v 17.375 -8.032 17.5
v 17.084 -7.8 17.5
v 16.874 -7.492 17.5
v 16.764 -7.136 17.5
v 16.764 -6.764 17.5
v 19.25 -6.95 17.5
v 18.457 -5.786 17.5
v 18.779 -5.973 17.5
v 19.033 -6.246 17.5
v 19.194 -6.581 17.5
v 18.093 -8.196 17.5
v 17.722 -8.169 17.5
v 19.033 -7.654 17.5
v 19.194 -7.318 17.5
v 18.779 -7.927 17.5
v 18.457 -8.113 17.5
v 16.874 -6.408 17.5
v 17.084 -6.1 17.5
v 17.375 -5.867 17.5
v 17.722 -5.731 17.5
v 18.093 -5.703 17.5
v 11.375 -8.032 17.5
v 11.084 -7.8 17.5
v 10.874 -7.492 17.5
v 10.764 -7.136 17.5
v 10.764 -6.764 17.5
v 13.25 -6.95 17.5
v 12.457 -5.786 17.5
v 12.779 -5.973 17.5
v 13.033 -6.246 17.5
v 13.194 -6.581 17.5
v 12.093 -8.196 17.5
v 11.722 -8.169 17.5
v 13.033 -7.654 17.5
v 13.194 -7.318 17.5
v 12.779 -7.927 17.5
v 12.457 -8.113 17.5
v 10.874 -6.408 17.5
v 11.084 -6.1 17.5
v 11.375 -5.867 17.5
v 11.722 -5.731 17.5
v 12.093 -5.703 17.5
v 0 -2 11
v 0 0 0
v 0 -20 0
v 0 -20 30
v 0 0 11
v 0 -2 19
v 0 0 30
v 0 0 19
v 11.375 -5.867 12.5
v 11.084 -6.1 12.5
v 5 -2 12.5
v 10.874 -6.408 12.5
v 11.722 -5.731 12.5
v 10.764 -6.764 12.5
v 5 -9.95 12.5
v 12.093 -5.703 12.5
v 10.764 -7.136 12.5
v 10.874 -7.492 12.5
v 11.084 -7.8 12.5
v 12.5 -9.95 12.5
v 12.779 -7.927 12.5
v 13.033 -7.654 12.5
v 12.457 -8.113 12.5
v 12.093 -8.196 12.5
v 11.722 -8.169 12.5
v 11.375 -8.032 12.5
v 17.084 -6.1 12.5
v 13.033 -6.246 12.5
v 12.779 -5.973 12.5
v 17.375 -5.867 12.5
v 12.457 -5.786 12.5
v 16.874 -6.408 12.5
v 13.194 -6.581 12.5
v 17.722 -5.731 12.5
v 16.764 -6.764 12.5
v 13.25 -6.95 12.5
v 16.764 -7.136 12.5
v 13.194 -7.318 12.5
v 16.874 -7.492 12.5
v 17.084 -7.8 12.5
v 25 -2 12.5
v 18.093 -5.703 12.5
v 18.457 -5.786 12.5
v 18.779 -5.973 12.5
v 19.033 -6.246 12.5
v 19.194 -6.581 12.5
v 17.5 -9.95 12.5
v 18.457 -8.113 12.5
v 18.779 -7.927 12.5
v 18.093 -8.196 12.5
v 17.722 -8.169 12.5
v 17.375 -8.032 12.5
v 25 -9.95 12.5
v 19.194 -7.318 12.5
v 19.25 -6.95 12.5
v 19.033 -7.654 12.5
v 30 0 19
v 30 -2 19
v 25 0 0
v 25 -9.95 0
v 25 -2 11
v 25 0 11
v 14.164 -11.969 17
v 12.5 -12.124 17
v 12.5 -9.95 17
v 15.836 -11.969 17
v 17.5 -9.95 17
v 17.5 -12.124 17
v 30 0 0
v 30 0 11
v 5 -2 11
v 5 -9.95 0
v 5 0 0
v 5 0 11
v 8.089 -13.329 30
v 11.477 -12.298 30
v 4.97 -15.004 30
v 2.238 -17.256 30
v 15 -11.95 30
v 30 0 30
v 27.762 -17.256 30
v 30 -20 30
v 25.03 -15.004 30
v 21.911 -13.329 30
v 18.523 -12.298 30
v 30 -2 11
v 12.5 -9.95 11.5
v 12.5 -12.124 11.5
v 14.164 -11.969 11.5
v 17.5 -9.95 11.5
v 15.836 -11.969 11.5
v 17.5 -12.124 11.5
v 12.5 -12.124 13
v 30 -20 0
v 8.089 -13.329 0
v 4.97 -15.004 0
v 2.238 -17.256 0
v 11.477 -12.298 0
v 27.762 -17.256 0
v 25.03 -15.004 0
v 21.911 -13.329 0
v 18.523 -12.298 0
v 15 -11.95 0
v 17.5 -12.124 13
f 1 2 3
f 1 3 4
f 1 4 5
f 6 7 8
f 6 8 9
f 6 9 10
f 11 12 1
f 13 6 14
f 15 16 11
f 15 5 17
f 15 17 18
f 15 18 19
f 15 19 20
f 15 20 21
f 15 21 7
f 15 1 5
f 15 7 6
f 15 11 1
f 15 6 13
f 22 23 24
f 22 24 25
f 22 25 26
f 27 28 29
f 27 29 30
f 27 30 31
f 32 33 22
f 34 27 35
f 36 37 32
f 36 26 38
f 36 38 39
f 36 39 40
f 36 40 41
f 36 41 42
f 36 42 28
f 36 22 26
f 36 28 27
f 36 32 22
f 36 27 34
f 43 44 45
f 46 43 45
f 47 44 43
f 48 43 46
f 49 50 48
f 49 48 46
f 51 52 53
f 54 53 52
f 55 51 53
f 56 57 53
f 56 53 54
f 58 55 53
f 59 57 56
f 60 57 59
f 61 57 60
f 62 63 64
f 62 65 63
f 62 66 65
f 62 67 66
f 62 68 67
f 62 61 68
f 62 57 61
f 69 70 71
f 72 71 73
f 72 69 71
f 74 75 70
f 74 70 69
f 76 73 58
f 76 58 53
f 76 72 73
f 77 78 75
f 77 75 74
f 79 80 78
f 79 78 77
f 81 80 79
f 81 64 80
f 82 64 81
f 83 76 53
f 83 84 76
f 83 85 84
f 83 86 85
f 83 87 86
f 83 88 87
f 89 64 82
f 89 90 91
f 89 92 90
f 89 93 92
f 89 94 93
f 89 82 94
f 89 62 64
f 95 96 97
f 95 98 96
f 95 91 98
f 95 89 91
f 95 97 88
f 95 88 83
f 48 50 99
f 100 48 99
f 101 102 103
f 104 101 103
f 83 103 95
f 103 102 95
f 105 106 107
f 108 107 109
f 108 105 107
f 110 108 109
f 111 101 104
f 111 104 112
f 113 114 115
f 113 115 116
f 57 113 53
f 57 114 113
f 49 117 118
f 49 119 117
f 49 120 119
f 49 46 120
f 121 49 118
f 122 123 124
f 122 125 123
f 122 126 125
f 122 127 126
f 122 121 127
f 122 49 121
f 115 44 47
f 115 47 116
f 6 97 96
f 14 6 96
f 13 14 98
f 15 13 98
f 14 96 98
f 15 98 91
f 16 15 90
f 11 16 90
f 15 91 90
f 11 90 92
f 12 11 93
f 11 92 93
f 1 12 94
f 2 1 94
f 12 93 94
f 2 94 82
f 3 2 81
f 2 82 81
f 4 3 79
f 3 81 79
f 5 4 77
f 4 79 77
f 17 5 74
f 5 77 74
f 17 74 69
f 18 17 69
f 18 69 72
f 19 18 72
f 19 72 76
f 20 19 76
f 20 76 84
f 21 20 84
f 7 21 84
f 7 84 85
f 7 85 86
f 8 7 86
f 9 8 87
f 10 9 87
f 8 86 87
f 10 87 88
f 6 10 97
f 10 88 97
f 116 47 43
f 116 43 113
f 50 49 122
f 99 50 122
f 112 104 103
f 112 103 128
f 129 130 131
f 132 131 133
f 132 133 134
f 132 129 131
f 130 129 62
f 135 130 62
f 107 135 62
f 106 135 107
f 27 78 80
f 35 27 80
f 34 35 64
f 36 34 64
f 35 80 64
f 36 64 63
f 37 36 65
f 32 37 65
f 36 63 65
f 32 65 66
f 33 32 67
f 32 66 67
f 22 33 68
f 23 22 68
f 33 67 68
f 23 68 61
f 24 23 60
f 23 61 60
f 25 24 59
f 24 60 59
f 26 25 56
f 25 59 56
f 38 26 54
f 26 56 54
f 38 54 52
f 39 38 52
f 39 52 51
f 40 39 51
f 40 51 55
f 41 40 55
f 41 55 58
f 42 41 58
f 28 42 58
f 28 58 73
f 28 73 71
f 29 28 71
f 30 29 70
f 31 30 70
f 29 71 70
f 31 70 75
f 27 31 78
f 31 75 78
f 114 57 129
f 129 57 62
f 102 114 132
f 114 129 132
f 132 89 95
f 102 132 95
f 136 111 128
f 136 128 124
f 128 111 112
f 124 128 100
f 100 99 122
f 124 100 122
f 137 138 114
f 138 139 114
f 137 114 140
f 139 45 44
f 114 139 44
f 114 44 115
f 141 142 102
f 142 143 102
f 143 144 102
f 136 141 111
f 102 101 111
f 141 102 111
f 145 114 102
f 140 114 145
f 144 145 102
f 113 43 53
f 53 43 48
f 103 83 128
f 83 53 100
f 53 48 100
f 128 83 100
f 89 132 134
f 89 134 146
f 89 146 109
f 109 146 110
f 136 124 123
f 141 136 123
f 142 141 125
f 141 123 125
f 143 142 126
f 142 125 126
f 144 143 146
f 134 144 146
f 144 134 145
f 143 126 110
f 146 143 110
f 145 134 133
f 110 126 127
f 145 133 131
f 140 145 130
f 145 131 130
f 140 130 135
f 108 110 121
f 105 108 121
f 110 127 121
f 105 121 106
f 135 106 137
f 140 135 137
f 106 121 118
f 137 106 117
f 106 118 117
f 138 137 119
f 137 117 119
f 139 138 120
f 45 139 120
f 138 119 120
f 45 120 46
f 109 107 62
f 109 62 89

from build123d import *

# Parameters (mm, degrees)
F0_W      = 30
F0_H      = 30
F1_DEPTH  = 20
F3_DEPTH  = 30.001
F7_W      = 5
F7_H      = 4
F8_DEPTH  = 3
F10_DEPTH = 1.5
F11_W     = 20
F11_H     = 12.5
F12_DEPTH = 9.9508743711
F13_W     = 30
F13_H     = 8
F14_DEPTH = 2
F15_R     = 1.25
F16_DEPTH = 5


with BuildPart() as f1:
    # F0 (on Front) → F1 (new body)
    with BuildSketch(Plane.XZ):
        with Locations((15, 15)):
            Rectangle(F0_W, F0_H)
    extrude(amount=F1_DEPTH)

    # F2 (on face) → F3 (cut, through all)
    with BuildSketch(Plane.XY.offset(30)):
        with BuildLine():
            Line((0, -20), (30, -20))
            ThreePointArc((30, -20), (15, -11.9498743711), (0, -20))
        make_face()
    extrude(amount=-F3_DEPTH, mode=Mode.SUBTRACT)

    # F7 (on offset) → F8 (cut)
    with BuildSketch(Plane.XZ.offset(12.9498743711)):
        with Locations((15, 15)):
            Rectangle(F7_W, F7_H)
    extrude(amount=-F8_DEPTH, mode=Mode.SUBTRACT)

    # F9 (on face) → F10 (cut)
    with BuildSketch(Plane.XY.offset(13)):
        with BuildLine():
            ThreePointArc((12.5, -12.1243309011), (15, -11.9498743711), (17.5, -12.1243309011))
            Line((17.5, -12.1243309011), (17.5, -9.9498743711))
            Line((17.5, -9.9498743711), (12.5, -9.9498743711))
            Line((12.5, -9.9498743711), (12.5, -12.1243309011))
        make_face()
    extrude(amount=-F10_DEPTH, mode=Mode.SUBTRACT)

    # F11 (on face) → F12 (cut, through all)
    with BuildSketch(Plane.XZ.offset(9.9498743711)):
        with Locations((15, 6.25)):
            Rectangle(F11_W, F11_H)
    extrude(amount=-F12_DEPTH, mode=Mode.SUBTRACT)

    # F13 (on face) → F14 (cut)
    with BuildSketch(Plane.XZ):
        with Locations((15, 15)):
            Rectangle(F13_W, F13_H)
    extrude(amount=F14_DEPTH, mode=Mode.SUBTRACT)

    # F15 (on face) → F16 (cut)
    with BuildSketch(Plane(origin=(0, 0, 12.5), x_dir=(1, 0, 0), z_dir=(0, 0, -1))):
        with Locations((18, 6.9498743711)):
            Circle(F15_R)
        with Locations((12, 6.9498743711)):
            Circle(F15_R)
    extrude(amount=-F16_DEPTH, mode=Mode.SUBTRACT)


solid = f1.part
